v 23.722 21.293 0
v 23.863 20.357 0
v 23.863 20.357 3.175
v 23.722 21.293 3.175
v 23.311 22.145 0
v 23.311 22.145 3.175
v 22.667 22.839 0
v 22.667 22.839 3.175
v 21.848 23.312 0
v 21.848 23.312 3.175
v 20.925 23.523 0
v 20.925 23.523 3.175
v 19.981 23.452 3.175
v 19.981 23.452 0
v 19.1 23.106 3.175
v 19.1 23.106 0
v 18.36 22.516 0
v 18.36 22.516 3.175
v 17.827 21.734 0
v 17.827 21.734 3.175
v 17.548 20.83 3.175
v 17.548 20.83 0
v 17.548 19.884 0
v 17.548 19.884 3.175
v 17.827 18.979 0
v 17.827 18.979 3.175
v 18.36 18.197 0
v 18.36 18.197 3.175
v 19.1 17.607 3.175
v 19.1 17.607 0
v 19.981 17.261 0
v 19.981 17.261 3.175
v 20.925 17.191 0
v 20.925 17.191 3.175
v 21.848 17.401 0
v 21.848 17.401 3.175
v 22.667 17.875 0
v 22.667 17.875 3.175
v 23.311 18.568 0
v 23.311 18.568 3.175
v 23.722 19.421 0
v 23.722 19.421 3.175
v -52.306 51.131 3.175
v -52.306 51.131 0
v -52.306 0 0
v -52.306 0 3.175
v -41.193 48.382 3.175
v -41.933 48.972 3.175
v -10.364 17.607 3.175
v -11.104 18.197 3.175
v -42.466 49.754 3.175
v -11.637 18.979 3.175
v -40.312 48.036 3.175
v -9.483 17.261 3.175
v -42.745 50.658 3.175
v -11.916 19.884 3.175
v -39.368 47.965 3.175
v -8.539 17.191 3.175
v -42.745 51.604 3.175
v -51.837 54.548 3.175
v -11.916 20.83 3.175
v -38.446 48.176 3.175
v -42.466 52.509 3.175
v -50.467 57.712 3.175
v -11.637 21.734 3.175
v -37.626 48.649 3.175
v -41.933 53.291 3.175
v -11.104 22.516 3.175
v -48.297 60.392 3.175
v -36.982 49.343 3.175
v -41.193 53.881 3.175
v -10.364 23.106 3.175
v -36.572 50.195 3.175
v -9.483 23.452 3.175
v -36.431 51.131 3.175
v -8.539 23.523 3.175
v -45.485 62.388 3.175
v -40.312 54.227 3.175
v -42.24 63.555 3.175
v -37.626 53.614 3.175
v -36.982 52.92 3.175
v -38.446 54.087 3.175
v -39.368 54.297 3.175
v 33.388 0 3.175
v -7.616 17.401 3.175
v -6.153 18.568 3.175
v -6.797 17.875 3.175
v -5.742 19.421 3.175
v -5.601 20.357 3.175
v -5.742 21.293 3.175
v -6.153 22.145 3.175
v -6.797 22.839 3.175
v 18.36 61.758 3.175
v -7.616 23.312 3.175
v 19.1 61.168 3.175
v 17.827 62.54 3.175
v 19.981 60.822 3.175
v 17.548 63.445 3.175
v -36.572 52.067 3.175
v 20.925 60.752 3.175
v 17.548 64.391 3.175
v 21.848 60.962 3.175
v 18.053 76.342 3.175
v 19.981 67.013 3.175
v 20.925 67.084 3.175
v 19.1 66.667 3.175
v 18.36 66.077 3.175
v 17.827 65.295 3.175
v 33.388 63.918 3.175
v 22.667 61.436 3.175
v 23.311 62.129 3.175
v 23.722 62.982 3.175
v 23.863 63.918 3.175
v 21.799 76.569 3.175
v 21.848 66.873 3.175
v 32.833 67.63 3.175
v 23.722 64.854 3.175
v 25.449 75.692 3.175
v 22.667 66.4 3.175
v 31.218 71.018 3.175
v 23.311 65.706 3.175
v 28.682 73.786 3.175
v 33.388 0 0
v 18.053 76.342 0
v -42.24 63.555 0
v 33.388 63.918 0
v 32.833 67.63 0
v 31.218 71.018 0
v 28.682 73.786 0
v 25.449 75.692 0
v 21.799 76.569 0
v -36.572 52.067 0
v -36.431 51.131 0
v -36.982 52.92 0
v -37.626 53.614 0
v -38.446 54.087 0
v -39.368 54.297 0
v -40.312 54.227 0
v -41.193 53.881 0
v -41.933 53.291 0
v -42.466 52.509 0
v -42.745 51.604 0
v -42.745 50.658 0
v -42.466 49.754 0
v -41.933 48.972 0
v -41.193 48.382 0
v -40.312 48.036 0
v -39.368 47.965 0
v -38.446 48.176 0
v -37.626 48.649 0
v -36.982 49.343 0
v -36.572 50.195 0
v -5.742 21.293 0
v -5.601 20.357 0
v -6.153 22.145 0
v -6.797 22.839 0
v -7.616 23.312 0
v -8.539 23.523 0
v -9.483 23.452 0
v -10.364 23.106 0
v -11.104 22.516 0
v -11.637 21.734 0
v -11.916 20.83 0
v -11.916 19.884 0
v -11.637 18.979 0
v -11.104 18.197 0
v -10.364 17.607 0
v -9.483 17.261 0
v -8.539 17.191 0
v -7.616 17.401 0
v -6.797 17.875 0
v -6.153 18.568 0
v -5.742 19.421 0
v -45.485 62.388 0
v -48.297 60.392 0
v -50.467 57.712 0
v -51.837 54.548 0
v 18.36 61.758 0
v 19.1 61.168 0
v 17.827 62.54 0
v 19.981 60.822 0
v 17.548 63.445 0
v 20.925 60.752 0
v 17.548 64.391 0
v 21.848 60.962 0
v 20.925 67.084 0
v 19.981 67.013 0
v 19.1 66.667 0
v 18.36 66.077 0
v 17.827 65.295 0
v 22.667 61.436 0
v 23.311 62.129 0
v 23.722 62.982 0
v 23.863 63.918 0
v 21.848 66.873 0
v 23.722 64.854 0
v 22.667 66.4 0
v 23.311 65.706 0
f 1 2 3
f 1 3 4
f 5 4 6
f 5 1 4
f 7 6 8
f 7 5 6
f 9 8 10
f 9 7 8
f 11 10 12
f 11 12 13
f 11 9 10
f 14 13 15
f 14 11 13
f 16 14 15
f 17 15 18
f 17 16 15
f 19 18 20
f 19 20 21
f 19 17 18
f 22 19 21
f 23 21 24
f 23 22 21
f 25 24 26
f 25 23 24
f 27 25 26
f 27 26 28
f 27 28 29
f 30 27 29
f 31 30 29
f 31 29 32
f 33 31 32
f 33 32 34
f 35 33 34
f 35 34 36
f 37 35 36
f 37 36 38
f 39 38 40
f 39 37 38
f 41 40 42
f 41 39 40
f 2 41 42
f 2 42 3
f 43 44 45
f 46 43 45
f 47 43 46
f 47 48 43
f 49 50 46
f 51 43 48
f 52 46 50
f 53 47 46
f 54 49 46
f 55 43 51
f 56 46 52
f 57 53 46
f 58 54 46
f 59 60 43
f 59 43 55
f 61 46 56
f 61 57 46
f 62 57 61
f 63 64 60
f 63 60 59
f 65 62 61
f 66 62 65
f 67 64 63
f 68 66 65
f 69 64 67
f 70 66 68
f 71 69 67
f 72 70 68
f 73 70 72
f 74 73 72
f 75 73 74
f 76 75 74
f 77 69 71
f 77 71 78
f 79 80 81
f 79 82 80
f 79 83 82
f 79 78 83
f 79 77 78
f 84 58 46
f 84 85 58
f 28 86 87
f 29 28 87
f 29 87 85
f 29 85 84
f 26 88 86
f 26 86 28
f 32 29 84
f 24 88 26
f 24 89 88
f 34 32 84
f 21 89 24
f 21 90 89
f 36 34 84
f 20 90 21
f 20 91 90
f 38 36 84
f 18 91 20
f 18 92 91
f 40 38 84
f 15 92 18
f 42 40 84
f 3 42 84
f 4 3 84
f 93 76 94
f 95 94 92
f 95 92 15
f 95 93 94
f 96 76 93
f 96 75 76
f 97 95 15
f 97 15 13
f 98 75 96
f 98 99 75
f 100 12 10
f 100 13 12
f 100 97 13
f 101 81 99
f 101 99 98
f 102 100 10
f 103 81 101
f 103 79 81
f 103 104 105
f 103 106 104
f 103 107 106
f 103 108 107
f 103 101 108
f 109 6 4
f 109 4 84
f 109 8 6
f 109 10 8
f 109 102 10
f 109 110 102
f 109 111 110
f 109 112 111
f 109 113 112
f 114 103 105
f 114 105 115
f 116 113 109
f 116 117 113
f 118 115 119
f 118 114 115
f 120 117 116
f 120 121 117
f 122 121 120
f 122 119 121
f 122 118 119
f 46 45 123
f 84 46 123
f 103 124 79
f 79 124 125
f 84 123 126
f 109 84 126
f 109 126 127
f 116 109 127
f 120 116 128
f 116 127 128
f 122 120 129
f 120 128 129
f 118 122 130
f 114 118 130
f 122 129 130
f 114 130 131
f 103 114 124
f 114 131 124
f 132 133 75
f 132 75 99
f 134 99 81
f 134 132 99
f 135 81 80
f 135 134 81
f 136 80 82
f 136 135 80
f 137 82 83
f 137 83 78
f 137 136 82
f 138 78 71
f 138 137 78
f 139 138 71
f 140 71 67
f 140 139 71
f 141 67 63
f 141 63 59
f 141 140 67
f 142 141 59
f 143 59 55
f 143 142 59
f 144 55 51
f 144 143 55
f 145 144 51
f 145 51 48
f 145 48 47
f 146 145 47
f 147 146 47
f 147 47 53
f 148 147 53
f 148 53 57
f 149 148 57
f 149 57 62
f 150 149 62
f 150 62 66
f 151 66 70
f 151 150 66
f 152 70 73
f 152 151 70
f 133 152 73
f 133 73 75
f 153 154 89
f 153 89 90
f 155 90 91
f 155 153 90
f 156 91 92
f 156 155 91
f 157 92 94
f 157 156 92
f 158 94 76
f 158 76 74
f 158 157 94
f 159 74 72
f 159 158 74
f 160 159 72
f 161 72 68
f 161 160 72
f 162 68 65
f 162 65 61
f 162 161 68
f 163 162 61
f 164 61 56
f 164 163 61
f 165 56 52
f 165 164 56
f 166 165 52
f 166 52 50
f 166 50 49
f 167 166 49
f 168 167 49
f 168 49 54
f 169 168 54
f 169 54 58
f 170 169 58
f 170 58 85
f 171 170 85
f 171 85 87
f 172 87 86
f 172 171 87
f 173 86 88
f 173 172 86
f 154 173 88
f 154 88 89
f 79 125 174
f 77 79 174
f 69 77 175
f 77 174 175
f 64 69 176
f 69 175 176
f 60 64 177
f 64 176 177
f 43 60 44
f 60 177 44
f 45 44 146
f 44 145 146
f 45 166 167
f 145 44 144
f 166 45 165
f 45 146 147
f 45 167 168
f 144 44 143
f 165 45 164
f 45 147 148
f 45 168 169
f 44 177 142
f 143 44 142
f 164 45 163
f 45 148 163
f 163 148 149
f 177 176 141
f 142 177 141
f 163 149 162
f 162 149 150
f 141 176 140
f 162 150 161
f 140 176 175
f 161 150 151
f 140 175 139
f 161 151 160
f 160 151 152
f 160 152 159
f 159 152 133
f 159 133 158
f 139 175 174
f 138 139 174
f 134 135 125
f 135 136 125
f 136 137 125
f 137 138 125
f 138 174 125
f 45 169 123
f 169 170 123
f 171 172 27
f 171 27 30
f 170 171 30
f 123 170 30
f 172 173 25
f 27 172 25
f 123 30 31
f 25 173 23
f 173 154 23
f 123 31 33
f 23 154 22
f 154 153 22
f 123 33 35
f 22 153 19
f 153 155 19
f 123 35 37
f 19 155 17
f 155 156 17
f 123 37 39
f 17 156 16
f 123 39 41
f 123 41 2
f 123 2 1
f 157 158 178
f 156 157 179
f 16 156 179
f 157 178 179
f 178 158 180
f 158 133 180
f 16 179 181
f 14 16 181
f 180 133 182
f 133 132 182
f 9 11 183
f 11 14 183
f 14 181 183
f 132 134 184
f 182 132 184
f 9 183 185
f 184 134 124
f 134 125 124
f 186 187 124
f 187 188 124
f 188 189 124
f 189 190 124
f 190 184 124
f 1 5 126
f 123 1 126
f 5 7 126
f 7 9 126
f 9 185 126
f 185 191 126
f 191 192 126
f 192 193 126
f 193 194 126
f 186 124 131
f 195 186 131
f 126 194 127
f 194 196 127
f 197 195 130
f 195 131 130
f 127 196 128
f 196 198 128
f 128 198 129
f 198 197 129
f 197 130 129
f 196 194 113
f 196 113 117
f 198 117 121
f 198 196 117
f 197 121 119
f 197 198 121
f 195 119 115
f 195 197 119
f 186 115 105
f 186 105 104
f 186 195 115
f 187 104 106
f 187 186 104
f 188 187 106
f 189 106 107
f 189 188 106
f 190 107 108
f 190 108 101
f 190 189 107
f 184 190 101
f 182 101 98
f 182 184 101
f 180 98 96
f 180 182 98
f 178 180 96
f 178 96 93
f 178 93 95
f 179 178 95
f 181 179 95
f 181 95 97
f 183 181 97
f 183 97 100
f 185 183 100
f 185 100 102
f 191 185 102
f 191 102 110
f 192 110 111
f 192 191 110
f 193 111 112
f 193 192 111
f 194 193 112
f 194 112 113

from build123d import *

# Parameters (mm, degrees)
SKETCH1_R           = 3.175
BOSS_EXTRUDE1_DEPTH = 3.175


with BuildPart() as part:
    # Sketch1 → Boss-Extrude1 (new body)
    with BuildSketch(Plane.XY):
        with BuildLine():
            Line((18.052936785, 76.341523137), (-42.240313215, 63.554909137))
            ThreePointArc((-42.240313215, 63.554909137), (-49.473481519, 59.125864726), (-52.305574358, 51.131216))
            Line((-52.305574358, 51.131216), (-52.305574358, 0))
            Line((-52.305574358, 0), (33.387675642, 0))
            Line((33.387675642, 0), (33.387675642, 63.91783))
            ThreePointArc((33.387675642, 63.91783), (28.682324369, 73.785737161), (18.052936785, 76.341523137))
        make_face()
        with Locations((20.687675642, 20.35683)):
            Circle(SKETCH1_R, mode=Mode.SUBTRACT)
        with Locations((20.687675642, 63.91783)):
            Circle(SKETCH1_R, mode=Mode.SUBTRACT)
        with Locations((-8.776324358, 20.35683)):
            Circle(SKETCH1_R, mode=Mode.SUBTRACT)
        with Locations((-39.605574358, 51.131216)):
            Circle(SKETCH1_R, mode=Mode.SUBTRACT)
    extrude(amount=BOSS_EXTRUDE1_DEPTH)


solid = part.part
